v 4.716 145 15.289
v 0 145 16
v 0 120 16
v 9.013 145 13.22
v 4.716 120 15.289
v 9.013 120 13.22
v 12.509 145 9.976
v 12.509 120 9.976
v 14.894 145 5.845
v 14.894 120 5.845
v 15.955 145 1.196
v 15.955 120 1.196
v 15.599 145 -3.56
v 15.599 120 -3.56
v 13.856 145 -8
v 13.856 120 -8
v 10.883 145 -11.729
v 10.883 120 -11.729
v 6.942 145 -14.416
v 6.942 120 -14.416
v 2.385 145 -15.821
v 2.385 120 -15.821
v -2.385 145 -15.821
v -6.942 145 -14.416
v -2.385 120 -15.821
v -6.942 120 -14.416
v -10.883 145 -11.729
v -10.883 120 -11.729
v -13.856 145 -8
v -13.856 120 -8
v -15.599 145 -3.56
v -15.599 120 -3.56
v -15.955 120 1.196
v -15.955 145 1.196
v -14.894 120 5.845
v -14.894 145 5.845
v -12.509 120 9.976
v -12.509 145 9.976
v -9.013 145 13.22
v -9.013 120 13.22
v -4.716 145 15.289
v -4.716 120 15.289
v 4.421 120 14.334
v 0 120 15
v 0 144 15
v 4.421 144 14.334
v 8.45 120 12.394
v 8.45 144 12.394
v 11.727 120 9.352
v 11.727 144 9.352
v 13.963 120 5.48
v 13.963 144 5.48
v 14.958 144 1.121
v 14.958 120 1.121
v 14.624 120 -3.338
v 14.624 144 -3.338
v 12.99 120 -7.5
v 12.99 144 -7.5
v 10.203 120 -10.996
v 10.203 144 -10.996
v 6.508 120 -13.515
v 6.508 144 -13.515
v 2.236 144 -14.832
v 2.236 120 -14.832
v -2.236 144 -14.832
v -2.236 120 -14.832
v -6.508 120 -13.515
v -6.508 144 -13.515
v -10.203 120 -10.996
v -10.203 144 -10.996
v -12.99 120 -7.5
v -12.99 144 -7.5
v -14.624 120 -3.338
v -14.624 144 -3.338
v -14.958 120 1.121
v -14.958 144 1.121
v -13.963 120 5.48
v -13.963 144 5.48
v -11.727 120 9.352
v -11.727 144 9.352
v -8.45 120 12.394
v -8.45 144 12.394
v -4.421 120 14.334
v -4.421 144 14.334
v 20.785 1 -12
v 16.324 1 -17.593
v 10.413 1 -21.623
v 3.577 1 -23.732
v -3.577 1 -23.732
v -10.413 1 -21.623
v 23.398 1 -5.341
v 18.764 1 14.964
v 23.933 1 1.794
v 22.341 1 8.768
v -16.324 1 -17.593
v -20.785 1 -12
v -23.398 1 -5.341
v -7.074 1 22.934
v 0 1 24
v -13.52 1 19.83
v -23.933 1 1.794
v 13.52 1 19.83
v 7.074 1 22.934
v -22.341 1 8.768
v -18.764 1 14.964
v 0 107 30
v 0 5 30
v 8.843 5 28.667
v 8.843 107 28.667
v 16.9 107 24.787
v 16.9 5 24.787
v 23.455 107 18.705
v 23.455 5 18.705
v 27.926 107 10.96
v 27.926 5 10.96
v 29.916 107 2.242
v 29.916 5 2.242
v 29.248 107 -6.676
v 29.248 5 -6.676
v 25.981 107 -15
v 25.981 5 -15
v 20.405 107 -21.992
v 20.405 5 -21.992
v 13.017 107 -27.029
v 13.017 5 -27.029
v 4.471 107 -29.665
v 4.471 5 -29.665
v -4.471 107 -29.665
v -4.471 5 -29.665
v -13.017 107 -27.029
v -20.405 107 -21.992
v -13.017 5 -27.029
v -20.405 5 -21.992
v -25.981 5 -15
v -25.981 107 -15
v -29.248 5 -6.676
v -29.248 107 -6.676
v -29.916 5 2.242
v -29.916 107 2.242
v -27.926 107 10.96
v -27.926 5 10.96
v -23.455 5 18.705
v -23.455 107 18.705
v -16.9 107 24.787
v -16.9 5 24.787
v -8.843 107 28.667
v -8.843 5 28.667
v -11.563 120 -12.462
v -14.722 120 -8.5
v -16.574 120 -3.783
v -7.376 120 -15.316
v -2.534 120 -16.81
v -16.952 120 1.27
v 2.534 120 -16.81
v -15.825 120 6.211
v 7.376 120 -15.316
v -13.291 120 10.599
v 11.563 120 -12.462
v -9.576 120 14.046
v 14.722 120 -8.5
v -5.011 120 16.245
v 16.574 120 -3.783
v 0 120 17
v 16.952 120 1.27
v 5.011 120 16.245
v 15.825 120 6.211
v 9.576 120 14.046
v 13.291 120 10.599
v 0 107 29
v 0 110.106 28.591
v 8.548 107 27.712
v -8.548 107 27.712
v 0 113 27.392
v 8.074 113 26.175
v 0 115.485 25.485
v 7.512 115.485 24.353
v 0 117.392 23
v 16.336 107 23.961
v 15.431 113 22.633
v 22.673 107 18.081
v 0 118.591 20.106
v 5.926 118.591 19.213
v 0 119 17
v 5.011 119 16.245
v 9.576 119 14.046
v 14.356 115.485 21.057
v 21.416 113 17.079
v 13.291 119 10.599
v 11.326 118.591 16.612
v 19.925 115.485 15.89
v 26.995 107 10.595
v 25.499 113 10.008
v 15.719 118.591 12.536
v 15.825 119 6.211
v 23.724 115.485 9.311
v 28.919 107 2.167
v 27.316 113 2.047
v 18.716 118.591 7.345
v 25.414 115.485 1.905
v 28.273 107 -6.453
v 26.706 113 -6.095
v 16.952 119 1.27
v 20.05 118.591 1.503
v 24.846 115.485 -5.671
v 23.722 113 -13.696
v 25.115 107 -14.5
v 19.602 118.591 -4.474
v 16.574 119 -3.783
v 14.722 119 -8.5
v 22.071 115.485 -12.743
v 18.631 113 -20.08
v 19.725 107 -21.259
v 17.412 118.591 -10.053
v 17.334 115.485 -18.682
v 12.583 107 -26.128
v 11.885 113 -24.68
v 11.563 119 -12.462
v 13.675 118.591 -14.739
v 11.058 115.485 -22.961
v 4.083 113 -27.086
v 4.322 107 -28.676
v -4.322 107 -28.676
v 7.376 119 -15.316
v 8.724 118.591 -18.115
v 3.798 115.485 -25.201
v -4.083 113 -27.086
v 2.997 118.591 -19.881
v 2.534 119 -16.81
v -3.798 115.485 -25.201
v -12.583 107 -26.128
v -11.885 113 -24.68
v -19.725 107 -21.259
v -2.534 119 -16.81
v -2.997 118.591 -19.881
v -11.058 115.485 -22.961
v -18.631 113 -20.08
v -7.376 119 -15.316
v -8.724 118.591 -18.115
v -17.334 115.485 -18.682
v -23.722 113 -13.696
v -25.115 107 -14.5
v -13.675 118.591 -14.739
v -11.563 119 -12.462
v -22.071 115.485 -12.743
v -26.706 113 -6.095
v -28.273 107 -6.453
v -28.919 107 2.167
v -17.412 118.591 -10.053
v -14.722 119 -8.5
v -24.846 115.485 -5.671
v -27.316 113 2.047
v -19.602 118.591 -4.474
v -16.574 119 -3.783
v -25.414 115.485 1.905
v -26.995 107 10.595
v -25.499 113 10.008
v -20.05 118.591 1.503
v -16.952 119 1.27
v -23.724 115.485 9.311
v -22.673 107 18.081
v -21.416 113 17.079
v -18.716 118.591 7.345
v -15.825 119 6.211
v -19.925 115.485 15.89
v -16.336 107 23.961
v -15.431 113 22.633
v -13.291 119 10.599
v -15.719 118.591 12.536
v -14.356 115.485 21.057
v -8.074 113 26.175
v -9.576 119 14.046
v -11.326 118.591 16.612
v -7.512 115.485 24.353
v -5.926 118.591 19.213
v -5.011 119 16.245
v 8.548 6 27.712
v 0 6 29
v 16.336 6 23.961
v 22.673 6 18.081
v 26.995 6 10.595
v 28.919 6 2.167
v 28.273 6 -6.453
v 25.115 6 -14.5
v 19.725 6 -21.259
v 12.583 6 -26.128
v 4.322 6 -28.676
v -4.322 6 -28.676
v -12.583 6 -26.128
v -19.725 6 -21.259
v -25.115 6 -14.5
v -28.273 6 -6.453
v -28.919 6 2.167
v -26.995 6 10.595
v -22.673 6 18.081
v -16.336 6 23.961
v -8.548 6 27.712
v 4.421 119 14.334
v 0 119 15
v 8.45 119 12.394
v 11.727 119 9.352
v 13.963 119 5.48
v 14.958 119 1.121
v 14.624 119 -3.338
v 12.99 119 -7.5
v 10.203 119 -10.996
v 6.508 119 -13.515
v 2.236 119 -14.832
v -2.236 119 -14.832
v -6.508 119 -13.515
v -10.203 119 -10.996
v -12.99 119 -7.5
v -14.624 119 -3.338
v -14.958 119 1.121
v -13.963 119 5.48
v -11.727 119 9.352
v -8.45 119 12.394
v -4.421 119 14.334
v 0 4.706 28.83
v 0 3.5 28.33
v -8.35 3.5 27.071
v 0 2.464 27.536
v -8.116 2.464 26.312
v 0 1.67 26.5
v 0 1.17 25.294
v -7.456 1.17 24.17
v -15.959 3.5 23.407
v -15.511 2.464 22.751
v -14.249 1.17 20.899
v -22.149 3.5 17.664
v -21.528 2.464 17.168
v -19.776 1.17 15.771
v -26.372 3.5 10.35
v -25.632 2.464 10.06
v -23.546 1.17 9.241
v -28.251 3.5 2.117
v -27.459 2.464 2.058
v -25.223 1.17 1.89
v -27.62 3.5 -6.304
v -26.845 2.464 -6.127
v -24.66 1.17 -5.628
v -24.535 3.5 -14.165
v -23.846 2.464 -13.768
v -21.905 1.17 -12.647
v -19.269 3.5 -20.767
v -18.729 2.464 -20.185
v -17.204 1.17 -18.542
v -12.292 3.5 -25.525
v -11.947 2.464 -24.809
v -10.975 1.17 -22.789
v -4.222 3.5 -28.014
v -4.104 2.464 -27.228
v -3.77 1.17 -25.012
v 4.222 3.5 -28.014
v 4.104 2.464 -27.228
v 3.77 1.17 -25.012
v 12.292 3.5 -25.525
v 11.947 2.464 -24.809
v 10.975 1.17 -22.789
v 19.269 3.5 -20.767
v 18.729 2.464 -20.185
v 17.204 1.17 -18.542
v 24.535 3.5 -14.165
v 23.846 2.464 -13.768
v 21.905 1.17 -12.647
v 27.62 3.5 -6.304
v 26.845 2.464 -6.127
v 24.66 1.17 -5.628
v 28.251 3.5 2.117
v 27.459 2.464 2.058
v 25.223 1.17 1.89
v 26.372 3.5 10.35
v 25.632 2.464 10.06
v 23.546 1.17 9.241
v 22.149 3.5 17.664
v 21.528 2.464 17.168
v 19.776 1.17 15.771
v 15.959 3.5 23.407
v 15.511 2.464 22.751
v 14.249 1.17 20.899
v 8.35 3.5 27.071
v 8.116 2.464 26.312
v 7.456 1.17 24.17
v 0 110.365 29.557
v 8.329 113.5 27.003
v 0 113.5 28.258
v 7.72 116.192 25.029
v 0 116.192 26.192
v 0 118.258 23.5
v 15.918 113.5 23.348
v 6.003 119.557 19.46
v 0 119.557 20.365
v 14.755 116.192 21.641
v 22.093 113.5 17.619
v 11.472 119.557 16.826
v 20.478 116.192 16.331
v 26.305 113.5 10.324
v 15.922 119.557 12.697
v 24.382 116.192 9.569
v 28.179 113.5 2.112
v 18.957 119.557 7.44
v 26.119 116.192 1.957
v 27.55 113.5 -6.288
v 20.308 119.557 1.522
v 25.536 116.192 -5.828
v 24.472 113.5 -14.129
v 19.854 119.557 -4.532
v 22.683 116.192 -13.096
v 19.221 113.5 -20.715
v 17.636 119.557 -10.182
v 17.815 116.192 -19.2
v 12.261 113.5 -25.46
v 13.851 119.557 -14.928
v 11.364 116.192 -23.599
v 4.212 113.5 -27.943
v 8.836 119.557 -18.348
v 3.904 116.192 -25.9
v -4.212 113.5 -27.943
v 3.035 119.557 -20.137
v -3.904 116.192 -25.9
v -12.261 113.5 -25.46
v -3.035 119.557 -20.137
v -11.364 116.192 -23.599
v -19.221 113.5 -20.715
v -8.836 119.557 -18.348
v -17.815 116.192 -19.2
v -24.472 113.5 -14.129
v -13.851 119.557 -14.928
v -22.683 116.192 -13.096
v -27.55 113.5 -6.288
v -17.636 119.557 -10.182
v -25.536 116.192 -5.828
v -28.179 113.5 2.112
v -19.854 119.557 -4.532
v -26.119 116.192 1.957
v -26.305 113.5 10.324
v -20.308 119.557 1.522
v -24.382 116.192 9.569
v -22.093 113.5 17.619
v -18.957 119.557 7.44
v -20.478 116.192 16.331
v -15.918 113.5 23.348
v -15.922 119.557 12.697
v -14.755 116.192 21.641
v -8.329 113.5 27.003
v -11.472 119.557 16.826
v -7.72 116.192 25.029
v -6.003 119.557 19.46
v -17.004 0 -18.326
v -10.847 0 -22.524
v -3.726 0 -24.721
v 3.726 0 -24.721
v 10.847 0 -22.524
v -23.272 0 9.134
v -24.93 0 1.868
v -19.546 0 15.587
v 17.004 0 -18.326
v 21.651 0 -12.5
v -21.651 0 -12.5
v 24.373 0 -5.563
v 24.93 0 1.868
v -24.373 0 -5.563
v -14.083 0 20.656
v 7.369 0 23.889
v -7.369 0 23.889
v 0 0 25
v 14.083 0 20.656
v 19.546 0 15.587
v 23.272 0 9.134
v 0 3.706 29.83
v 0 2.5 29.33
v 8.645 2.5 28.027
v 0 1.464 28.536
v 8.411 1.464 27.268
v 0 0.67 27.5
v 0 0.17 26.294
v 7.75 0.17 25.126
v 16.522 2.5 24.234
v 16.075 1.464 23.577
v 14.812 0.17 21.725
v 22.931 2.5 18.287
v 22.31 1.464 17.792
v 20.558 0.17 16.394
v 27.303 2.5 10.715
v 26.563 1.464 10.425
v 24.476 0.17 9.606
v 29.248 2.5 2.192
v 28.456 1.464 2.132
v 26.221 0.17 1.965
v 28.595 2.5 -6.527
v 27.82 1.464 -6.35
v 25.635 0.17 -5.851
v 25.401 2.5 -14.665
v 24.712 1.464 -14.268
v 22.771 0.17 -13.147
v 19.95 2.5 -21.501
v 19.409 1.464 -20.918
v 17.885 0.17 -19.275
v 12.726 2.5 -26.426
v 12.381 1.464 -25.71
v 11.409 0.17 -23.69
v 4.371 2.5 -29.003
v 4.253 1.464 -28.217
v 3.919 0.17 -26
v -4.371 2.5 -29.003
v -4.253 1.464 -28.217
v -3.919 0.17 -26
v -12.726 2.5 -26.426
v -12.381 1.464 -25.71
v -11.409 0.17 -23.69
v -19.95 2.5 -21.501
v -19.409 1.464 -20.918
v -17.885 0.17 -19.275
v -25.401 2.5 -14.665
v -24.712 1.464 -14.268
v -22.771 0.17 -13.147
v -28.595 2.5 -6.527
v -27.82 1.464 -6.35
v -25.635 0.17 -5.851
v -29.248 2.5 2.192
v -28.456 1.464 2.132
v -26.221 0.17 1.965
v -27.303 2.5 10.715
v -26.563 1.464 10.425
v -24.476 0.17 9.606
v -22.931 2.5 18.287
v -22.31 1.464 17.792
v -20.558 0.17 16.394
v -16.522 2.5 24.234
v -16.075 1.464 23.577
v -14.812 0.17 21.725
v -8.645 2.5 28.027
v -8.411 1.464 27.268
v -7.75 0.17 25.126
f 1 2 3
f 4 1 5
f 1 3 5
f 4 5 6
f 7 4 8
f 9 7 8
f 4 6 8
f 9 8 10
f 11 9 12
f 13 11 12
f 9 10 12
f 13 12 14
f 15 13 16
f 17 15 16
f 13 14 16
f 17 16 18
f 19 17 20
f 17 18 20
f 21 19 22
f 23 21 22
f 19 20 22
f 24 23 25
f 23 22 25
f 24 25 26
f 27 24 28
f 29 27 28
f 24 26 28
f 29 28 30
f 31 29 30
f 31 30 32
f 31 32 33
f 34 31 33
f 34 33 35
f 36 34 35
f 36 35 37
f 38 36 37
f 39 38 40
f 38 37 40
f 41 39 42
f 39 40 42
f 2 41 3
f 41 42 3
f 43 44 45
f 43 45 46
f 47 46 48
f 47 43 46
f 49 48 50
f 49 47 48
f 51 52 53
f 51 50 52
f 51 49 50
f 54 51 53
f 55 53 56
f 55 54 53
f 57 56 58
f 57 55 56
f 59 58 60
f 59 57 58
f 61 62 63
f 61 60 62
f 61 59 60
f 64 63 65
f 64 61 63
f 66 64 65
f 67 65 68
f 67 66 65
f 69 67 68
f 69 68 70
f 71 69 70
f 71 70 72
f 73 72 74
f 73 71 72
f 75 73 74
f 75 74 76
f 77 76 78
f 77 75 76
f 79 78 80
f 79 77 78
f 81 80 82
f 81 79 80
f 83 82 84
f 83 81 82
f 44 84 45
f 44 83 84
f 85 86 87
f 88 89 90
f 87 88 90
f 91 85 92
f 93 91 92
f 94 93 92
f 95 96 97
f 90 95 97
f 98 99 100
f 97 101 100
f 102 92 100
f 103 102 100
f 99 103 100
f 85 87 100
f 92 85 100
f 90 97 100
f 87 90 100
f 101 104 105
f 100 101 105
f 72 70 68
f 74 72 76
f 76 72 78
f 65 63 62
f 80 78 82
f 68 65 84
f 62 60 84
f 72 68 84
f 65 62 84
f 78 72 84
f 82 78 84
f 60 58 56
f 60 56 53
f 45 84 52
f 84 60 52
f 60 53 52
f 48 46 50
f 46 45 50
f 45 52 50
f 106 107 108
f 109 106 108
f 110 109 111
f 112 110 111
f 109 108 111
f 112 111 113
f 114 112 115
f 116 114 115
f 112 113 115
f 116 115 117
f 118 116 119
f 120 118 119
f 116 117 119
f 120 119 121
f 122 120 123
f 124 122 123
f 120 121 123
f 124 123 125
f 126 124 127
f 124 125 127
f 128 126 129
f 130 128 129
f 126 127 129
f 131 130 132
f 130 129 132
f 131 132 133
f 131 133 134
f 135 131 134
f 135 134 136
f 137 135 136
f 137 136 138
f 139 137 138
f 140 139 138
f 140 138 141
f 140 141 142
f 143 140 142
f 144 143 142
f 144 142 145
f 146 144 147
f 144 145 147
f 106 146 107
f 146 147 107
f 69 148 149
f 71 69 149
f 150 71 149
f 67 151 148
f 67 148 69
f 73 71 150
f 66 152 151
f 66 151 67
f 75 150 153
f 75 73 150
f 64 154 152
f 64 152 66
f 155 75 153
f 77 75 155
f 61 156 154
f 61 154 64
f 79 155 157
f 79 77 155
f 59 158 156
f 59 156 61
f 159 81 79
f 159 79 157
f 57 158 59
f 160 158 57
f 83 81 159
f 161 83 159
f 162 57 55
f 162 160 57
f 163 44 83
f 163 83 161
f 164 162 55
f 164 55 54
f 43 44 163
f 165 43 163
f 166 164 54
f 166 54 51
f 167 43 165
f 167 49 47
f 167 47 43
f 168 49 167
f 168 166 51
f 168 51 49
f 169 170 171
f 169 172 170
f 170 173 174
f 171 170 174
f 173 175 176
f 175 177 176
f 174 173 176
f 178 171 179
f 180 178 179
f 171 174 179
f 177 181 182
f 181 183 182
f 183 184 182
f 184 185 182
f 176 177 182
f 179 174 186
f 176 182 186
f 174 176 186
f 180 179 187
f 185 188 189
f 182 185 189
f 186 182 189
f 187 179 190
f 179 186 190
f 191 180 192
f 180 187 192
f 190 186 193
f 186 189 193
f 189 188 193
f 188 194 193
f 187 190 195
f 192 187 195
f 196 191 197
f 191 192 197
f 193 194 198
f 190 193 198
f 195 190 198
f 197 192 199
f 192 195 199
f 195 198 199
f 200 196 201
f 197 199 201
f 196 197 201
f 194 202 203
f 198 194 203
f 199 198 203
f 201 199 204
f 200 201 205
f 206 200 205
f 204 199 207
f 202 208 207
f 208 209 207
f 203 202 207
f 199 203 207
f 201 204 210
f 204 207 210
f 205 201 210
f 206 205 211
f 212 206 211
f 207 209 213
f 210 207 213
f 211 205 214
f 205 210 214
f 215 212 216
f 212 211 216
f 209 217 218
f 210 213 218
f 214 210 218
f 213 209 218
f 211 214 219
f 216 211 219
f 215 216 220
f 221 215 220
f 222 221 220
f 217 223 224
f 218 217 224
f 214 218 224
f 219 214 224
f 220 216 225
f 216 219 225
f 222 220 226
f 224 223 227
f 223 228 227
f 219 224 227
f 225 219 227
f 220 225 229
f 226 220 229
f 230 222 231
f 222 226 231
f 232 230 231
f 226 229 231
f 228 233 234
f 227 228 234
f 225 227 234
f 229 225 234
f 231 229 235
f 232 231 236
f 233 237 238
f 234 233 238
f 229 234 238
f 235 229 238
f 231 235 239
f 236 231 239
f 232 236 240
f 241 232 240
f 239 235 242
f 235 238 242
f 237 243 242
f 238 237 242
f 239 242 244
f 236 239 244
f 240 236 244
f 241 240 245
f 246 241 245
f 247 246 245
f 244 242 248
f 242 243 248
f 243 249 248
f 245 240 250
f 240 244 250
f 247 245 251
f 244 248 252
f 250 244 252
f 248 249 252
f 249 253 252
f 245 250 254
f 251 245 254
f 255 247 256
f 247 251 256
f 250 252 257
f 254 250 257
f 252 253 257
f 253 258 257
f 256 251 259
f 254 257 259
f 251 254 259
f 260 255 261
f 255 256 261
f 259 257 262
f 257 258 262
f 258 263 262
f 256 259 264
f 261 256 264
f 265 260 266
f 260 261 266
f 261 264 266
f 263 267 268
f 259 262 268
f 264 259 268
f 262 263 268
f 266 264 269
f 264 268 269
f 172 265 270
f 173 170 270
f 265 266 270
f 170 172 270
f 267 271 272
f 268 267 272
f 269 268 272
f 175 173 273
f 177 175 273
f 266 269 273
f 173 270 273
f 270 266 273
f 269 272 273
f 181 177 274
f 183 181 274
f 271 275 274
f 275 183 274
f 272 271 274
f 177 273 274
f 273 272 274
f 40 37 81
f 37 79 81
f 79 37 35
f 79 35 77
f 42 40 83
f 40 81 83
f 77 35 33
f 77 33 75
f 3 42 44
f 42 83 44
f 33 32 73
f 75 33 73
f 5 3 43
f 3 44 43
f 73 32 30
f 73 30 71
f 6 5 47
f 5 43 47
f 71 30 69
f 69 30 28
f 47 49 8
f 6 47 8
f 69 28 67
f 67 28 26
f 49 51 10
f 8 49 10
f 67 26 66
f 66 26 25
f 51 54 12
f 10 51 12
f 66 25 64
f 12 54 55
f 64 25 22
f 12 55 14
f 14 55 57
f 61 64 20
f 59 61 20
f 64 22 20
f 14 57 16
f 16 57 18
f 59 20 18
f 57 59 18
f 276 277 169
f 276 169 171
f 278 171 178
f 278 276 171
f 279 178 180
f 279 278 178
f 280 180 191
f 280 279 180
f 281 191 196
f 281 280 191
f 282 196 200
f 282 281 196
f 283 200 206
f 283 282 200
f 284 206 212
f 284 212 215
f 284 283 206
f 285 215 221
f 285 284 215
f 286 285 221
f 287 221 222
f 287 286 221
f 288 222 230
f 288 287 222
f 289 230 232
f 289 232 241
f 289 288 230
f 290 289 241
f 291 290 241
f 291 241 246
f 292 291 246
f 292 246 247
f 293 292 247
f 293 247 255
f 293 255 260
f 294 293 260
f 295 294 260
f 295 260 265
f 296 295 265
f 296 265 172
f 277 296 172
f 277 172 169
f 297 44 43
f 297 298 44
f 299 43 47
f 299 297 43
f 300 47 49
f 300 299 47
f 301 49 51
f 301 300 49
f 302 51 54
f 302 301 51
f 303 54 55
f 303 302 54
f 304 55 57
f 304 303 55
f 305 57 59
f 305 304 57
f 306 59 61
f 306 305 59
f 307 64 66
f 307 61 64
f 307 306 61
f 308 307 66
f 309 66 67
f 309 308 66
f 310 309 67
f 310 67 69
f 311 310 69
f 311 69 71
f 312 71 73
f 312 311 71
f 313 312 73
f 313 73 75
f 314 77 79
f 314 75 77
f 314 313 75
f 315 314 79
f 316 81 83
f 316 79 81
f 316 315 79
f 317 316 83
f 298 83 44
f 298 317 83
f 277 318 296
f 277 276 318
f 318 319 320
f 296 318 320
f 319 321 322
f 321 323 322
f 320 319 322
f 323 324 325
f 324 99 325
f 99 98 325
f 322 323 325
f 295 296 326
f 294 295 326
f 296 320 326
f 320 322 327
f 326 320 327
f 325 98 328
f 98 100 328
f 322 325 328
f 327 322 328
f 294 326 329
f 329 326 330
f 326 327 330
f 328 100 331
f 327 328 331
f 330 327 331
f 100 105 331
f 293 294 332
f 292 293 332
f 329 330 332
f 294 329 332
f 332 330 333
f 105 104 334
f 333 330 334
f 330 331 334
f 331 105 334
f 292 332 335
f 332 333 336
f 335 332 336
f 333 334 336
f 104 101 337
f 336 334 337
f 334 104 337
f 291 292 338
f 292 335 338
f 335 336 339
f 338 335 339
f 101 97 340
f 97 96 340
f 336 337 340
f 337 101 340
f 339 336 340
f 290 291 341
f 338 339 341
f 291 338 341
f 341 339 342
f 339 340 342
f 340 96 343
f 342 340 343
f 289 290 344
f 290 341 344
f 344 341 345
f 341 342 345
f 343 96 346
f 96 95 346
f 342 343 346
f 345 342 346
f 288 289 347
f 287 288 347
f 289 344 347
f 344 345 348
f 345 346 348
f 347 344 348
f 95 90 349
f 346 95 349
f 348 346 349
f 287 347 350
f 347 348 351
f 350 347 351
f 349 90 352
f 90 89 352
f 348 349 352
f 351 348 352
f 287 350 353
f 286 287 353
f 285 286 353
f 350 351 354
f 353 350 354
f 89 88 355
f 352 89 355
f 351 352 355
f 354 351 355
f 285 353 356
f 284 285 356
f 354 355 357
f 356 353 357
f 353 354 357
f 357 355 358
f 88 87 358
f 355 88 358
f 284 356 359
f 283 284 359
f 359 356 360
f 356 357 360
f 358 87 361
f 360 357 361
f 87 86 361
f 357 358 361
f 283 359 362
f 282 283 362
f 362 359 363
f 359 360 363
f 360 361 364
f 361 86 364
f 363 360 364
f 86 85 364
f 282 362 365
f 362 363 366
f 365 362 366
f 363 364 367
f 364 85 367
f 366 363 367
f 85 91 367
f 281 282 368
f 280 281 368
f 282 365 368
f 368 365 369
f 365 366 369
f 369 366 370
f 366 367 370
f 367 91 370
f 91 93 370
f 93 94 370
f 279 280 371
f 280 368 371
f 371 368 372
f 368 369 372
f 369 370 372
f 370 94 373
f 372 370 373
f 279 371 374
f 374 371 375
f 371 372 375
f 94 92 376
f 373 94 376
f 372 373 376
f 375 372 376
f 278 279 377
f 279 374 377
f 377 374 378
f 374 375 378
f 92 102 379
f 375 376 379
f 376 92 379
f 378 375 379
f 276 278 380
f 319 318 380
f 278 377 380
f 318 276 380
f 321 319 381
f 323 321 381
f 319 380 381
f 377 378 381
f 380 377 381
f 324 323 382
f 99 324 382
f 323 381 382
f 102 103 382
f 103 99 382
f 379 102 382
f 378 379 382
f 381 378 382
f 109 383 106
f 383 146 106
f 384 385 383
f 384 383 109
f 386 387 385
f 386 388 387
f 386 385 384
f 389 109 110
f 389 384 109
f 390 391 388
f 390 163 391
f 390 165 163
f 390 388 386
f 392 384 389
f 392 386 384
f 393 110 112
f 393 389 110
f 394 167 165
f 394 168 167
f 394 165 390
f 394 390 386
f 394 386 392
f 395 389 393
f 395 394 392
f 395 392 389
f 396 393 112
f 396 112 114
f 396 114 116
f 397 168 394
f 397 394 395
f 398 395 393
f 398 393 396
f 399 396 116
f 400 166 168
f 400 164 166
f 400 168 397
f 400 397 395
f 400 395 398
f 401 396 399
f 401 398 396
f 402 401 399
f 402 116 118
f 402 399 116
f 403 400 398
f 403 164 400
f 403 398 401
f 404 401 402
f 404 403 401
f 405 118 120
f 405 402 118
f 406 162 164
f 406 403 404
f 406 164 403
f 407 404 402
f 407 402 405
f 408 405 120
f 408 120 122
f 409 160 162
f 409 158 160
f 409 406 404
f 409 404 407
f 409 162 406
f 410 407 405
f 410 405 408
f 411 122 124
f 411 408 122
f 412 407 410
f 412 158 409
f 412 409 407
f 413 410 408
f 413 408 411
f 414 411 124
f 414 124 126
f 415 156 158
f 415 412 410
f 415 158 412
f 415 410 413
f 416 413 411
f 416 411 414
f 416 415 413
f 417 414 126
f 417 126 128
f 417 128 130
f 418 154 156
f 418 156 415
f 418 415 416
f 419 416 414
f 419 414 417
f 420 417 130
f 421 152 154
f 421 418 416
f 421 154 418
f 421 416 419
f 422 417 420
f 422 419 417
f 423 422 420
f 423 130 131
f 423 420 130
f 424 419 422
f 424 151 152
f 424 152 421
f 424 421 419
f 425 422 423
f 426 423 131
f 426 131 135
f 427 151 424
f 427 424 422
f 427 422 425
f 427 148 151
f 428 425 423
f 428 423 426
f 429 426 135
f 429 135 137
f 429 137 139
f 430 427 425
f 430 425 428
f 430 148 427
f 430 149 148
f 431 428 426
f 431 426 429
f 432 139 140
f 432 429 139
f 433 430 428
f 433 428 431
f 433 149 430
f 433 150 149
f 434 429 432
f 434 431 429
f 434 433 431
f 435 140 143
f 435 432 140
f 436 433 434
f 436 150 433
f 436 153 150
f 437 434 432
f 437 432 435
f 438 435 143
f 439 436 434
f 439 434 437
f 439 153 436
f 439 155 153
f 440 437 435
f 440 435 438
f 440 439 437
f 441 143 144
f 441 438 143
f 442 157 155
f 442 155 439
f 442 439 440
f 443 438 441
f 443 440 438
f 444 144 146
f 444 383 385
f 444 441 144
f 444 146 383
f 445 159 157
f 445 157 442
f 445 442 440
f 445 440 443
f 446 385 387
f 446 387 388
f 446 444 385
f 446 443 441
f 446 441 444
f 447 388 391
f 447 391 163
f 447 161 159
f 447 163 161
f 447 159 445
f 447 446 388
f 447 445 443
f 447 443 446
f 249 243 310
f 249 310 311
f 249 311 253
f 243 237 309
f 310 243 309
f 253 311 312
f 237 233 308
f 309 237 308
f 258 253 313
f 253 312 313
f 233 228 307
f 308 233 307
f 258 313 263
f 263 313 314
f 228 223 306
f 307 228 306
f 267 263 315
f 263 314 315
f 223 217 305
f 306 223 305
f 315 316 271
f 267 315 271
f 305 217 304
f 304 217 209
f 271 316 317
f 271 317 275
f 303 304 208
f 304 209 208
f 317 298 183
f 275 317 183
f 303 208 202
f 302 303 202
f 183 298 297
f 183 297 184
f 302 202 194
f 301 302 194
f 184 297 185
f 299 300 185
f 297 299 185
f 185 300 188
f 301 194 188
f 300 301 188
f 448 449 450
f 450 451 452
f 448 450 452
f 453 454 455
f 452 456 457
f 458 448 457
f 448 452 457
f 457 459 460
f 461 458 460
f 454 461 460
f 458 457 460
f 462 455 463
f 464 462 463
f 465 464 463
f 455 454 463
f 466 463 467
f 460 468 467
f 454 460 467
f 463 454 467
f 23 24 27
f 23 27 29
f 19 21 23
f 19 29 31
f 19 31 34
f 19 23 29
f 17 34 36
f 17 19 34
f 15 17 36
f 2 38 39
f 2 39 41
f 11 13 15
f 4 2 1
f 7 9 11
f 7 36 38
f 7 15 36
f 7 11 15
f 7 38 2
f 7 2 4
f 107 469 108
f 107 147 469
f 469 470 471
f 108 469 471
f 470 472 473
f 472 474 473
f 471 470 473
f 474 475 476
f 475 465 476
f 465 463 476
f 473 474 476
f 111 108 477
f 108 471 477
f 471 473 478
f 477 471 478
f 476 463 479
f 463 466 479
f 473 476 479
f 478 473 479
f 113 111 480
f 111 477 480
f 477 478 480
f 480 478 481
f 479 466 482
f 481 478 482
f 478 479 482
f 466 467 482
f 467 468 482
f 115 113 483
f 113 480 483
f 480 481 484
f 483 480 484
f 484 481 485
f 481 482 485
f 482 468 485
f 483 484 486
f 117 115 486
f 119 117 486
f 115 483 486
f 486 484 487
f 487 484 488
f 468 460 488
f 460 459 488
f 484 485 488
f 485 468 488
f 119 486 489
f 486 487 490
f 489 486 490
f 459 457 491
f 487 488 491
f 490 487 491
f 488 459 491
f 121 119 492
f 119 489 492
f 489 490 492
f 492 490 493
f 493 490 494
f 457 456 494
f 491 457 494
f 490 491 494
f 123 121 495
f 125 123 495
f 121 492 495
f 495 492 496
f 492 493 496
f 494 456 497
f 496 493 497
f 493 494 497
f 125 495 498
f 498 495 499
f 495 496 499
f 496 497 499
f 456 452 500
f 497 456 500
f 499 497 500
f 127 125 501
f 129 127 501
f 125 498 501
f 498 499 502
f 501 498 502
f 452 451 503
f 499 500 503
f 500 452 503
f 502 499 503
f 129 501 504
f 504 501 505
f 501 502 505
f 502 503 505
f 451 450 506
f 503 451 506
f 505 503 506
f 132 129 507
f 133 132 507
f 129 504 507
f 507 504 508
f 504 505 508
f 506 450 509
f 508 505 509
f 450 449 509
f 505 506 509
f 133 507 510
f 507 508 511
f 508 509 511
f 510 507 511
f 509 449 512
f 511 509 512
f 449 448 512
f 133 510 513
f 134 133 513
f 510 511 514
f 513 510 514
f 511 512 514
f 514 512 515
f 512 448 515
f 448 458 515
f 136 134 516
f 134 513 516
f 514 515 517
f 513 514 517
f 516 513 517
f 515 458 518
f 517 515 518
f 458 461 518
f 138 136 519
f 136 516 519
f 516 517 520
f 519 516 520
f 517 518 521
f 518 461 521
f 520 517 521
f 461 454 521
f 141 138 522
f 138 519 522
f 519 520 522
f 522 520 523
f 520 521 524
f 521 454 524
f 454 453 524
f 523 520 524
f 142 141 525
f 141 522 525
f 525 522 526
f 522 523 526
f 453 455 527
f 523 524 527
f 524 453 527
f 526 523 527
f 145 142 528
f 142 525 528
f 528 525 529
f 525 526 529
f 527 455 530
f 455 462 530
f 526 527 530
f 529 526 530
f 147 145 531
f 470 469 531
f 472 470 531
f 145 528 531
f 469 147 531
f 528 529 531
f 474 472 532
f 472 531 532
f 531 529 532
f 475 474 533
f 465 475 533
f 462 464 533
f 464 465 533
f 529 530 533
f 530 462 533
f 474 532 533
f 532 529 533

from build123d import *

# Parameters (mm, degrees)
SKETCH1_R           = 30
BOSS_EXTRUDE1_DEPTH = 120
SKETCH2_R           = 16
BOSS_EXTRUDE2_DEPTH = 25
FILLET1_R           = 13
SHELL2_T            = -1
SKETCH3_R           = 30
BOSS_EXTRUDE3_DEPTH = 1
FILLET2_R           = 5


with BuildPart() as part:
    # Sketch1 → Boss-Extrude1 (new body)
    with BuildSketch(Plane(origin=(0, 0, 0), x_dir=(1, 0, 0), z_dir=(0, 1, 0))):
        Circle(SKETCH1_R)
    extrude(amount=BOSS_EXTRUDE1_DEPTH)

    # Sketch2 → Boss-Extrude2 (add)
    with BuildSketch(Plane(origin=(0, 120, 0), x_dir=(1, 0, 0), z_dir=(0, 1, 0))):
        Circle(SKETCH2_R)
    extrude(amount=BOSS_EXTRUDE2_DEPTH)

    # Fillet1
    fillet1_edges = [part.edges().sort_by_distance(p)[0] for p in [
        (-30, 120, 0),
    ]]
    fillet(fillet1_edges, radius=FILLET1_R)

    # Shell2
    shell2_openings = [part.faces().sort_by_distance(p)[0] for p in [
        (0, 0, 0),
    ]]
    offset(amount=SHELL2_T, openings=shell2_openings, kind=Kind.INTERSECTION)

    # Sketch3 → Boss-Extrude3 (add)
    with BuildSketch(Plane.XZ):
        Circle(SKETCH3_R)
    extrude(amount=-BOSS_EXTRUDE3_DEPTH)


with BuildPart() as body_2:
    # Split1: the piece on the far side of the plane
    add(part.part)
    split(bisect_by=Plane.ZX.offset(120), keep=Keep.BOTTOM)

    # Fillet2
    fillet2_edges = [body_2.edges().sort_by_distance(p)[0] for p in [
        (-30, 0, 0),
        (-29, 1, 0),
    ]]
    fillet(fillet2_edges, radius=FILLET2_R)


with BuildPart() as part_1:
    add(part.part)

    # Split1
    split(bisect_by=Plane.ZX.offset(120), keep=Keep.TOP)


solid = Compound([body_2.part, part_1.part])
